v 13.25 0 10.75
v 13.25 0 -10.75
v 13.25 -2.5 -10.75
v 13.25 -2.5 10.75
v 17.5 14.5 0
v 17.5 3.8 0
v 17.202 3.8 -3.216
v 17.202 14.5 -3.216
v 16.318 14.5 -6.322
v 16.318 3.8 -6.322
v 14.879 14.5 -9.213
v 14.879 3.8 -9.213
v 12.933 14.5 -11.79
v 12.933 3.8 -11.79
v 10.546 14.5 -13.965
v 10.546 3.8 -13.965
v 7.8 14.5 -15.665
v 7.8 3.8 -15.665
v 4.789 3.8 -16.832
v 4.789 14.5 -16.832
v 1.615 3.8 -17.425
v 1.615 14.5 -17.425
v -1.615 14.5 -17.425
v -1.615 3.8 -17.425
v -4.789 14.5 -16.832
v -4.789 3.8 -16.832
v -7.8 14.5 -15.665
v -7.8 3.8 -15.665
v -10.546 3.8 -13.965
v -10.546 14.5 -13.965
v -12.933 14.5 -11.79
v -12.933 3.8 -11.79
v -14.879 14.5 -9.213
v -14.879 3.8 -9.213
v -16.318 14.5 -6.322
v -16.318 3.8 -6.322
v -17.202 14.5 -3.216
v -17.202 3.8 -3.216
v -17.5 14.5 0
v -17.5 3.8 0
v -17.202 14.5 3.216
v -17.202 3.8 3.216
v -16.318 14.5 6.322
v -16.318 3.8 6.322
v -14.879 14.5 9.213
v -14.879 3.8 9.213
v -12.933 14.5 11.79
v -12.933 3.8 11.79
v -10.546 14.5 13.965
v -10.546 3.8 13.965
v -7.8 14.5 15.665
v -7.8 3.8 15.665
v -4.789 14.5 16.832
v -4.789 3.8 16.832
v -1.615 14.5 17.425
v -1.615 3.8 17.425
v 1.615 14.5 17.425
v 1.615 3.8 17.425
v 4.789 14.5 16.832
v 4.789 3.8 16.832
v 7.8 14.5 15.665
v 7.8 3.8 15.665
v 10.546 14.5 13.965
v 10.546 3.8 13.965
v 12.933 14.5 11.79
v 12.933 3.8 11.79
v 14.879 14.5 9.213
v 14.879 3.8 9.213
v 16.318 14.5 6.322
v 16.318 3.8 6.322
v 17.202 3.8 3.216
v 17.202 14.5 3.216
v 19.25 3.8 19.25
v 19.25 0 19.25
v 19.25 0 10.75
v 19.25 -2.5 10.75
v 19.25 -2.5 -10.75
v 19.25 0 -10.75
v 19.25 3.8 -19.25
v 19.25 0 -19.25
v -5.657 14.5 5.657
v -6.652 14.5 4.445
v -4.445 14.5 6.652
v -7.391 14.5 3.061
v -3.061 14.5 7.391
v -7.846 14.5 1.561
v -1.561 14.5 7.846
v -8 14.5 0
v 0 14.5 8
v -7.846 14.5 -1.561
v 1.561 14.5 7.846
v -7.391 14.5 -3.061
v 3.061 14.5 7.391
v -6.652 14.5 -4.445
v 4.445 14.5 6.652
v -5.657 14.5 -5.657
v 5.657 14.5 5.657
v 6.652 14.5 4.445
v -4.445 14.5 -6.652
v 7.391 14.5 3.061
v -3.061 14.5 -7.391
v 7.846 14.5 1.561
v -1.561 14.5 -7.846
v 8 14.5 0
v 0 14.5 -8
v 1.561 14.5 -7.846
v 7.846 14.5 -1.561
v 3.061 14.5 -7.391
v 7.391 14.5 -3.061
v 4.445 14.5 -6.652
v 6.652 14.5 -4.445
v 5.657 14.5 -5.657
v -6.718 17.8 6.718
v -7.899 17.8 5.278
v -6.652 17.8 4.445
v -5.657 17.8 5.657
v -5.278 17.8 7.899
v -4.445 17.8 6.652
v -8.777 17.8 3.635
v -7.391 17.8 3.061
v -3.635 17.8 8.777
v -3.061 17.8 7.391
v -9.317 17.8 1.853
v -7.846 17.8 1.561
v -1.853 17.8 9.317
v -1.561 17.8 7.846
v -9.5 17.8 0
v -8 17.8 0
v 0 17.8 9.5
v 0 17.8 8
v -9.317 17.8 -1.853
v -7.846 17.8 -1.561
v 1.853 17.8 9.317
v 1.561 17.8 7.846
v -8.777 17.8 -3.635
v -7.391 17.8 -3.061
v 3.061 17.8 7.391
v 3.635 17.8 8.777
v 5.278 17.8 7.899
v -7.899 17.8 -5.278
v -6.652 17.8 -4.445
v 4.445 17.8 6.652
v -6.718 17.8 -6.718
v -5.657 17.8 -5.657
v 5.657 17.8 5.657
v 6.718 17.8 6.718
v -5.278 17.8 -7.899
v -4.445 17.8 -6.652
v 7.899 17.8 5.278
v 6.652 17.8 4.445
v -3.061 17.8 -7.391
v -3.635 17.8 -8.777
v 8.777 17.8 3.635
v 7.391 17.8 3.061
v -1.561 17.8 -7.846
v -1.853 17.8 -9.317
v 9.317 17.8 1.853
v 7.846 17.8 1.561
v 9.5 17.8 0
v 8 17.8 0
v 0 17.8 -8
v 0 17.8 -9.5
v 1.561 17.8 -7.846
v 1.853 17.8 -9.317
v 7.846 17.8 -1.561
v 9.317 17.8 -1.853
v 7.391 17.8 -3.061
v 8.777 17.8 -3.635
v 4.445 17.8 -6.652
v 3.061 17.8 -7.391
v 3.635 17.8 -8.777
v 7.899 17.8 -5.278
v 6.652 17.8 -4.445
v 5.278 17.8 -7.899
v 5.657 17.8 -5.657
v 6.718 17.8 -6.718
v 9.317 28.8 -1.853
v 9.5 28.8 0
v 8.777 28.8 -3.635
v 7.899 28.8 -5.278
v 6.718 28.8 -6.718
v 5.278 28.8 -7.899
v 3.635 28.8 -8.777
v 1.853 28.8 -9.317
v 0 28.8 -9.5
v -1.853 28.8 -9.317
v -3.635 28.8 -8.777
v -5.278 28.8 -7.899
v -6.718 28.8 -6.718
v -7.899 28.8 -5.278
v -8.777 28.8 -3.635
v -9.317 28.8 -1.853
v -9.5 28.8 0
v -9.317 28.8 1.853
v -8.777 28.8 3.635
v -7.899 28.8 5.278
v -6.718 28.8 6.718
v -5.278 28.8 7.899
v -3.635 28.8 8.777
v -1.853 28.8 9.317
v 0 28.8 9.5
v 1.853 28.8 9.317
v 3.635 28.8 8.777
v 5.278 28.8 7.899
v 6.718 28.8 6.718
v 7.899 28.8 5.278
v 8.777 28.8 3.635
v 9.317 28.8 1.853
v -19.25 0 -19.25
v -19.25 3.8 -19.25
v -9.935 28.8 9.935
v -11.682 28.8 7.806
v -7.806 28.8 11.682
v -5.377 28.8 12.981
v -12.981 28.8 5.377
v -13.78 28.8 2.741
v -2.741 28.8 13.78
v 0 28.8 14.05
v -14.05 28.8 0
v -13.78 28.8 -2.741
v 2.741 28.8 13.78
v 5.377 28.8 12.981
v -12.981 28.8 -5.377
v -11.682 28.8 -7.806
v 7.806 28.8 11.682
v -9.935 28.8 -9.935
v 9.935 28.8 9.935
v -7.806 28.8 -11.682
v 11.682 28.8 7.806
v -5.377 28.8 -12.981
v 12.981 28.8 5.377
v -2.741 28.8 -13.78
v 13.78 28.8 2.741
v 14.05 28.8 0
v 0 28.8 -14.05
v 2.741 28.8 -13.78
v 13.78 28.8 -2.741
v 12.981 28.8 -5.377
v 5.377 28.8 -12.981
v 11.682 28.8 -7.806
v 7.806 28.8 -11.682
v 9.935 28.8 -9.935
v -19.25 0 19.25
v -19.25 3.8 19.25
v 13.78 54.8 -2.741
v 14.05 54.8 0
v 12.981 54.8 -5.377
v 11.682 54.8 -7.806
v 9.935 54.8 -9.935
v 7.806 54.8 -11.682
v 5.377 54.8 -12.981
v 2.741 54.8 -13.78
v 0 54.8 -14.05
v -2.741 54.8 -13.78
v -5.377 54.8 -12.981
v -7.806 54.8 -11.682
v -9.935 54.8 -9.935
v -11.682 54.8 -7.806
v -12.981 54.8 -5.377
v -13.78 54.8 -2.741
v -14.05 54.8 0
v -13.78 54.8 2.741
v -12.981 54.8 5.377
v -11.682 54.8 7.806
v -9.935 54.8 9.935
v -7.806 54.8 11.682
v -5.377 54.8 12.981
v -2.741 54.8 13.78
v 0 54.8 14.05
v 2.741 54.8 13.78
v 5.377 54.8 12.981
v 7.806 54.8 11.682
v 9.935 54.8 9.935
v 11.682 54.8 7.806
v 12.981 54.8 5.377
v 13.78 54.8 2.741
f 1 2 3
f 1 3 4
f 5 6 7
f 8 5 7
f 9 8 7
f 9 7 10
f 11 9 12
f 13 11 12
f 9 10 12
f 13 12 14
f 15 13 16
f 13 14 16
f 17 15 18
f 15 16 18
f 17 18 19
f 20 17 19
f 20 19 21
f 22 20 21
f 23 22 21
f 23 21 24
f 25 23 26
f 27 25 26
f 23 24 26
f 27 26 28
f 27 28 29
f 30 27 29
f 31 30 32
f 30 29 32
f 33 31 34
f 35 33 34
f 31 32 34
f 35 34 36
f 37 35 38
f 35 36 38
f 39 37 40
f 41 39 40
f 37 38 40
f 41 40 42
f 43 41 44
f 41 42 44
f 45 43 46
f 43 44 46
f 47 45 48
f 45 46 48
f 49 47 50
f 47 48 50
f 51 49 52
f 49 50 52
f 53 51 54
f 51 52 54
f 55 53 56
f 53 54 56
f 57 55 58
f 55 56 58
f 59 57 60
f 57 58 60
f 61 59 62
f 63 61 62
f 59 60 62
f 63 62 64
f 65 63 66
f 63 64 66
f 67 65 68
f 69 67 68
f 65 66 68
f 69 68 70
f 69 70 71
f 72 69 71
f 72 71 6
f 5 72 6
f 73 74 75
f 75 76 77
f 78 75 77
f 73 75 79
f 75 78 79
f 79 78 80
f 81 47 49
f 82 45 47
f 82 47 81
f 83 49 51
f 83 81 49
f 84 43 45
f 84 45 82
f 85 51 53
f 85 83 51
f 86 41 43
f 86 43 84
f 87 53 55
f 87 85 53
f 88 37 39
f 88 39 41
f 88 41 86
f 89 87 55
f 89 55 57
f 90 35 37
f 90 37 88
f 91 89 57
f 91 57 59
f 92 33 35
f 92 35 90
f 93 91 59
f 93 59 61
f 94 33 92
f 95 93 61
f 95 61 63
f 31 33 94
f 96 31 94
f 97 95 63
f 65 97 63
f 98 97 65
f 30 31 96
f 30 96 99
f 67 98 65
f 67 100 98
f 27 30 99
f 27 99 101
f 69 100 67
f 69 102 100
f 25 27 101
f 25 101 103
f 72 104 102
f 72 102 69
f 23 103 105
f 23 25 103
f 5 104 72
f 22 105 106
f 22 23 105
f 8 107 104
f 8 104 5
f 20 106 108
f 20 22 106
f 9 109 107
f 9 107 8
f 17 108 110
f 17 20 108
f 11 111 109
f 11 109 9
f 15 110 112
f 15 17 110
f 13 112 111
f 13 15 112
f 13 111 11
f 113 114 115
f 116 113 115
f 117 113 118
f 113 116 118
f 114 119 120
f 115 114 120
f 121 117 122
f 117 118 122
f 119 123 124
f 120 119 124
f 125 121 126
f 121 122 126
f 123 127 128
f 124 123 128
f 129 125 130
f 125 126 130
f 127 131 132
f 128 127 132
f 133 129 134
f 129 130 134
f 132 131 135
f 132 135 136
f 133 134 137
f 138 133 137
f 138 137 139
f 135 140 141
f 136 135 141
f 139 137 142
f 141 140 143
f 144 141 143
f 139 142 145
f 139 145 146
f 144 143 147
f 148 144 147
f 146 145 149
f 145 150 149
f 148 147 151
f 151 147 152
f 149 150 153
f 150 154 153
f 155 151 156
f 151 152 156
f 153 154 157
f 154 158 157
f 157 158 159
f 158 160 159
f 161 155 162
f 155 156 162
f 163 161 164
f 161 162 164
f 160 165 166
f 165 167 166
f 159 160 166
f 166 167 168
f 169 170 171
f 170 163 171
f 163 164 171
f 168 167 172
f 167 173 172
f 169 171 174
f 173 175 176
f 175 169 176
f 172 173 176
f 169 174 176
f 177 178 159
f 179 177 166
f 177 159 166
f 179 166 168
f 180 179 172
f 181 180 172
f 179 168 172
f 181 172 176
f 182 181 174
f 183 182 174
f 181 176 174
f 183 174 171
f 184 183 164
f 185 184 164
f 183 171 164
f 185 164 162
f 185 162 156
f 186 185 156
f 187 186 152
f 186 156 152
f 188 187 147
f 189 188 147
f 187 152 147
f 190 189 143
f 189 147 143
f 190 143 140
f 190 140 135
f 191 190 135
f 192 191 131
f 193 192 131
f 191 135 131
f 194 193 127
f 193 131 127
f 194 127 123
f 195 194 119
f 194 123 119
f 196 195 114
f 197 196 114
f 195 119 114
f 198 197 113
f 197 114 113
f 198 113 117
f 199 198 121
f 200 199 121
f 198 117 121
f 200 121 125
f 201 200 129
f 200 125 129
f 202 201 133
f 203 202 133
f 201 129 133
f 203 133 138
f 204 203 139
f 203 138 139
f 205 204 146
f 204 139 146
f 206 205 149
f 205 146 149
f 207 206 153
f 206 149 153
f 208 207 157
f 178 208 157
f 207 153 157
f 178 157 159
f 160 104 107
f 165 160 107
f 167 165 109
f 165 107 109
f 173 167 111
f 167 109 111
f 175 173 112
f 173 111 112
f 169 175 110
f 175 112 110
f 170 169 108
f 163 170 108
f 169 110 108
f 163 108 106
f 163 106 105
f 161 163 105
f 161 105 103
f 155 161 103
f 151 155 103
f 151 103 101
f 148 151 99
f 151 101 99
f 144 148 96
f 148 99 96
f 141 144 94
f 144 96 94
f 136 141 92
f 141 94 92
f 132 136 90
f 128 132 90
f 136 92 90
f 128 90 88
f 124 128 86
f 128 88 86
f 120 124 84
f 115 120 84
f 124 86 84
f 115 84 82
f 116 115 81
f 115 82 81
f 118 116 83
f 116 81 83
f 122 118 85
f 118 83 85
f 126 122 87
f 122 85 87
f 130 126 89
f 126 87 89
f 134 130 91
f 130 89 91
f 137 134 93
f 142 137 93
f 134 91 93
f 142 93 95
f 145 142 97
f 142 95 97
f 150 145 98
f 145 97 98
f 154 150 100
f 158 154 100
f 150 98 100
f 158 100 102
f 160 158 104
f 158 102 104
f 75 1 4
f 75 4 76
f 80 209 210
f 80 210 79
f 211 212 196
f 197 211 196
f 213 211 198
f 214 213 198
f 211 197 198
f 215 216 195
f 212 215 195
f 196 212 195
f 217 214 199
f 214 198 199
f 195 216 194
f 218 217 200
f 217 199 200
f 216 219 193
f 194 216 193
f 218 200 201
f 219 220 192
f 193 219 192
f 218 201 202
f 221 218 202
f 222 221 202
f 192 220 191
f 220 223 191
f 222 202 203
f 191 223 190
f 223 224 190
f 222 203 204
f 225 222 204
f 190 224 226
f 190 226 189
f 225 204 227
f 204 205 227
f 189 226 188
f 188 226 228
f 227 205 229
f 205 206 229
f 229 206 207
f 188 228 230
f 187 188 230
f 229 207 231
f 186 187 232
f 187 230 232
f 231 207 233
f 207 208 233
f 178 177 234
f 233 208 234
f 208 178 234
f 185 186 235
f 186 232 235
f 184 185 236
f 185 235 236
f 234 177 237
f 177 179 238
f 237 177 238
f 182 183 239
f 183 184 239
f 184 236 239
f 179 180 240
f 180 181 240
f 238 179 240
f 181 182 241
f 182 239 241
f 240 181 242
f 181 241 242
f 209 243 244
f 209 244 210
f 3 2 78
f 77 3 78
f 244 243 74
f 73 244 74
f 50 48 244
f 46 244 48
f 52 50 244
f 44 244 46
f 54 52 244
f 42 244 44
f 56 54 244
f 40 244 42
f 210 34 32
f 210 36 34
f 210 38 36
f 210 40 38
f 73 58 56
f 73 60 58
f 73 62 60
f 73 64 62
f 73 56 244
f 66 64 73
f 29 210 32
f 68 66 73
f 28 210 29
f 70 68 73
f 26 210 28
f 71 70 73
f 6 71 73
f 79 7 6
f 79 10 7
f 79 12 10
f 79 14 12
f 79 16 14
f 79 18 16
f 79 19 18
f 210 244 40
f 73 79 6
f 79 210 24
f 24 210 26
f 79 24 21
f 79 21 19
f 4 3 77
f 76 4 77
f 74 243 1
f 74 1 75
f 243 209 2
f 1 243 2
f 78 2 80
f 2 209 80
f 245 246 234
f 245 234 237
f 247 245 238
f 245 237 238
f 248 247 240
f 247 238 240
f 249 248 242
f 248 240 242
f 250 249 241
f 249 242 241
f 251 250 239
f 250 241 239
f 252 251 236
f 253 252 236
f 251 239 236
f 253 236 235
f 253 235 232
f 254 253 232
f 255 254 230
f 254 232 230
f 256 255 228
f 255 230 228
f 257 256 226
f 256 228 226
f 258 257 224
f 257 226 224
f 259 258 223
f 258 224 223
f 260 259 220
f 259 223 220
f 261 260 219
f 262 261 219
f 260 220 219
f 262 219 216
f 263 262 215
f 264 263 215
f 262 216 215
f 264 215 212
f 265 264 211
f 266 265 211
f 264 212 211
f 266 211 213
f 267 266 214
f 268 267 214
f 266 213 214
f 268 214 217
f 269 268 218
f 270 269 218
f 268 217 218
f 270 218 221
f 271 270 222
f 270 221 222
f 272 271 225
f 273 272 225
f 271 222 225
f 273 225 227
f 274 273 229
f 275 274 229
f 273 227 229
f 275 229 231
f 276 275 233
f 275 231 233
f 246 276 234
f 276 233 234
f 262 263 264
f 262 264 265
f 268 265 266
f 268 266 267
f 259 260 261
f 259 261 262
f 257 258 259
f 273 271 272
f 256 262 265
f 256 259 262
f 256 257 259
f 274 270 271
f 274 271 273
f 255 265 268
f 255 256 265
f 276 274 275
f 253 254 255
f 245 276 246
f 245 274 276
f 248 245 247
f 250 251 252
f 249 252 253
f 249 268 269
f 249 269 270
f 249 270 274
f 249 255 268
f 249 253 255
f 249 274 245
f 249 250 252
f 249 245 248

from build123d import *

# Parameters (mm, degrees)
SKETCH1_W           = 38.5
SKETCH1_H           = 38.5
BOSS_EXTRUDE1_DEPTH = 3.8
SKETCH2_R           = 17.5
BOSS_EXTRUDE2_DEPTH = 10.7
SKETCH3_R           = 8
BOSS_EXTRUDE3_DEPTH = 3.3
SKETCH4_R           = 9.5
BOSS_EXTRUDE4_DEPTH = 11
SKETCH5_R           = 14.05
BOSS_EXTRUDE5_DEPTH = 26
SKETCH7_W           = 6
SKETCH7_H           = 21.5
BOSS_EXTRUDE6_DEPTH = 2.5


with BuildPart() as part:
    # Sketch1 → Boss-Extrude1 (new body)
    with BuildSketch(Plane(origin=(0, 0, 0), x_dir=(1, 0, 0), z_dir=(0, 1, 0))):
        Rectangle(SKETCH1_W, SKETCH1_H)
    extrude(amount=BOSS_EXTRUDE1_DEPTH)

    # Sketch2 → Boss-Extrude2 (add)
    with BuildSketch(Plane(origin=(0, 3.8, 0), x_dir=(1, 0, 0), z_dir=(0, 1, 0))):
        Circle(SKETCH2_R)
    extrude(amount=BOSS_EXTRUDE2_DEPTH)

    # Sketch3 → Boss-Extrude3 (add)
    with BuildSketch(Plane(origin=(0, 14.5, 0), x_dir=(1, 0, 0), z_dir=(0, 1, 0))):
        Circle(SKETCH3_R)
    extrude(amount=BOSS_EXTRUDE3_DEPTH)

    # Sketch4 → Boss-Extrude4 (add)
    with BuildSketch(Plane(origin=(0, 17.8, 0), x_dir=(1, 0, 0), z_dir=(0, 1, 0))):
        Circle(SKETCH4_R)
    extrude(amount=BOSS_EXTRUDE4_DEPTH)

    # Sketch5 → Boss-Extrude5 (add)
    with BuildSketch(Plane(origin=(0, 28.8, 0), x_dir=(1, 0, 0), z_dir=(0, 1, 0))):
        Circle(SKETCH5_R)
    extrude(amount=BOSS_EXTRUDE5_DEPTH)

    # Sketch7 → Boss-Extrude6 (add)
    with BuildSketch(Plane.XZ):
        with Locations((16.25, 0)):
            Rectangle(SKETCH7_W, SKETCH7_H)
    extrude(amount=BOSS_EXTRUDE6_DEPTH)


solid = part.part
